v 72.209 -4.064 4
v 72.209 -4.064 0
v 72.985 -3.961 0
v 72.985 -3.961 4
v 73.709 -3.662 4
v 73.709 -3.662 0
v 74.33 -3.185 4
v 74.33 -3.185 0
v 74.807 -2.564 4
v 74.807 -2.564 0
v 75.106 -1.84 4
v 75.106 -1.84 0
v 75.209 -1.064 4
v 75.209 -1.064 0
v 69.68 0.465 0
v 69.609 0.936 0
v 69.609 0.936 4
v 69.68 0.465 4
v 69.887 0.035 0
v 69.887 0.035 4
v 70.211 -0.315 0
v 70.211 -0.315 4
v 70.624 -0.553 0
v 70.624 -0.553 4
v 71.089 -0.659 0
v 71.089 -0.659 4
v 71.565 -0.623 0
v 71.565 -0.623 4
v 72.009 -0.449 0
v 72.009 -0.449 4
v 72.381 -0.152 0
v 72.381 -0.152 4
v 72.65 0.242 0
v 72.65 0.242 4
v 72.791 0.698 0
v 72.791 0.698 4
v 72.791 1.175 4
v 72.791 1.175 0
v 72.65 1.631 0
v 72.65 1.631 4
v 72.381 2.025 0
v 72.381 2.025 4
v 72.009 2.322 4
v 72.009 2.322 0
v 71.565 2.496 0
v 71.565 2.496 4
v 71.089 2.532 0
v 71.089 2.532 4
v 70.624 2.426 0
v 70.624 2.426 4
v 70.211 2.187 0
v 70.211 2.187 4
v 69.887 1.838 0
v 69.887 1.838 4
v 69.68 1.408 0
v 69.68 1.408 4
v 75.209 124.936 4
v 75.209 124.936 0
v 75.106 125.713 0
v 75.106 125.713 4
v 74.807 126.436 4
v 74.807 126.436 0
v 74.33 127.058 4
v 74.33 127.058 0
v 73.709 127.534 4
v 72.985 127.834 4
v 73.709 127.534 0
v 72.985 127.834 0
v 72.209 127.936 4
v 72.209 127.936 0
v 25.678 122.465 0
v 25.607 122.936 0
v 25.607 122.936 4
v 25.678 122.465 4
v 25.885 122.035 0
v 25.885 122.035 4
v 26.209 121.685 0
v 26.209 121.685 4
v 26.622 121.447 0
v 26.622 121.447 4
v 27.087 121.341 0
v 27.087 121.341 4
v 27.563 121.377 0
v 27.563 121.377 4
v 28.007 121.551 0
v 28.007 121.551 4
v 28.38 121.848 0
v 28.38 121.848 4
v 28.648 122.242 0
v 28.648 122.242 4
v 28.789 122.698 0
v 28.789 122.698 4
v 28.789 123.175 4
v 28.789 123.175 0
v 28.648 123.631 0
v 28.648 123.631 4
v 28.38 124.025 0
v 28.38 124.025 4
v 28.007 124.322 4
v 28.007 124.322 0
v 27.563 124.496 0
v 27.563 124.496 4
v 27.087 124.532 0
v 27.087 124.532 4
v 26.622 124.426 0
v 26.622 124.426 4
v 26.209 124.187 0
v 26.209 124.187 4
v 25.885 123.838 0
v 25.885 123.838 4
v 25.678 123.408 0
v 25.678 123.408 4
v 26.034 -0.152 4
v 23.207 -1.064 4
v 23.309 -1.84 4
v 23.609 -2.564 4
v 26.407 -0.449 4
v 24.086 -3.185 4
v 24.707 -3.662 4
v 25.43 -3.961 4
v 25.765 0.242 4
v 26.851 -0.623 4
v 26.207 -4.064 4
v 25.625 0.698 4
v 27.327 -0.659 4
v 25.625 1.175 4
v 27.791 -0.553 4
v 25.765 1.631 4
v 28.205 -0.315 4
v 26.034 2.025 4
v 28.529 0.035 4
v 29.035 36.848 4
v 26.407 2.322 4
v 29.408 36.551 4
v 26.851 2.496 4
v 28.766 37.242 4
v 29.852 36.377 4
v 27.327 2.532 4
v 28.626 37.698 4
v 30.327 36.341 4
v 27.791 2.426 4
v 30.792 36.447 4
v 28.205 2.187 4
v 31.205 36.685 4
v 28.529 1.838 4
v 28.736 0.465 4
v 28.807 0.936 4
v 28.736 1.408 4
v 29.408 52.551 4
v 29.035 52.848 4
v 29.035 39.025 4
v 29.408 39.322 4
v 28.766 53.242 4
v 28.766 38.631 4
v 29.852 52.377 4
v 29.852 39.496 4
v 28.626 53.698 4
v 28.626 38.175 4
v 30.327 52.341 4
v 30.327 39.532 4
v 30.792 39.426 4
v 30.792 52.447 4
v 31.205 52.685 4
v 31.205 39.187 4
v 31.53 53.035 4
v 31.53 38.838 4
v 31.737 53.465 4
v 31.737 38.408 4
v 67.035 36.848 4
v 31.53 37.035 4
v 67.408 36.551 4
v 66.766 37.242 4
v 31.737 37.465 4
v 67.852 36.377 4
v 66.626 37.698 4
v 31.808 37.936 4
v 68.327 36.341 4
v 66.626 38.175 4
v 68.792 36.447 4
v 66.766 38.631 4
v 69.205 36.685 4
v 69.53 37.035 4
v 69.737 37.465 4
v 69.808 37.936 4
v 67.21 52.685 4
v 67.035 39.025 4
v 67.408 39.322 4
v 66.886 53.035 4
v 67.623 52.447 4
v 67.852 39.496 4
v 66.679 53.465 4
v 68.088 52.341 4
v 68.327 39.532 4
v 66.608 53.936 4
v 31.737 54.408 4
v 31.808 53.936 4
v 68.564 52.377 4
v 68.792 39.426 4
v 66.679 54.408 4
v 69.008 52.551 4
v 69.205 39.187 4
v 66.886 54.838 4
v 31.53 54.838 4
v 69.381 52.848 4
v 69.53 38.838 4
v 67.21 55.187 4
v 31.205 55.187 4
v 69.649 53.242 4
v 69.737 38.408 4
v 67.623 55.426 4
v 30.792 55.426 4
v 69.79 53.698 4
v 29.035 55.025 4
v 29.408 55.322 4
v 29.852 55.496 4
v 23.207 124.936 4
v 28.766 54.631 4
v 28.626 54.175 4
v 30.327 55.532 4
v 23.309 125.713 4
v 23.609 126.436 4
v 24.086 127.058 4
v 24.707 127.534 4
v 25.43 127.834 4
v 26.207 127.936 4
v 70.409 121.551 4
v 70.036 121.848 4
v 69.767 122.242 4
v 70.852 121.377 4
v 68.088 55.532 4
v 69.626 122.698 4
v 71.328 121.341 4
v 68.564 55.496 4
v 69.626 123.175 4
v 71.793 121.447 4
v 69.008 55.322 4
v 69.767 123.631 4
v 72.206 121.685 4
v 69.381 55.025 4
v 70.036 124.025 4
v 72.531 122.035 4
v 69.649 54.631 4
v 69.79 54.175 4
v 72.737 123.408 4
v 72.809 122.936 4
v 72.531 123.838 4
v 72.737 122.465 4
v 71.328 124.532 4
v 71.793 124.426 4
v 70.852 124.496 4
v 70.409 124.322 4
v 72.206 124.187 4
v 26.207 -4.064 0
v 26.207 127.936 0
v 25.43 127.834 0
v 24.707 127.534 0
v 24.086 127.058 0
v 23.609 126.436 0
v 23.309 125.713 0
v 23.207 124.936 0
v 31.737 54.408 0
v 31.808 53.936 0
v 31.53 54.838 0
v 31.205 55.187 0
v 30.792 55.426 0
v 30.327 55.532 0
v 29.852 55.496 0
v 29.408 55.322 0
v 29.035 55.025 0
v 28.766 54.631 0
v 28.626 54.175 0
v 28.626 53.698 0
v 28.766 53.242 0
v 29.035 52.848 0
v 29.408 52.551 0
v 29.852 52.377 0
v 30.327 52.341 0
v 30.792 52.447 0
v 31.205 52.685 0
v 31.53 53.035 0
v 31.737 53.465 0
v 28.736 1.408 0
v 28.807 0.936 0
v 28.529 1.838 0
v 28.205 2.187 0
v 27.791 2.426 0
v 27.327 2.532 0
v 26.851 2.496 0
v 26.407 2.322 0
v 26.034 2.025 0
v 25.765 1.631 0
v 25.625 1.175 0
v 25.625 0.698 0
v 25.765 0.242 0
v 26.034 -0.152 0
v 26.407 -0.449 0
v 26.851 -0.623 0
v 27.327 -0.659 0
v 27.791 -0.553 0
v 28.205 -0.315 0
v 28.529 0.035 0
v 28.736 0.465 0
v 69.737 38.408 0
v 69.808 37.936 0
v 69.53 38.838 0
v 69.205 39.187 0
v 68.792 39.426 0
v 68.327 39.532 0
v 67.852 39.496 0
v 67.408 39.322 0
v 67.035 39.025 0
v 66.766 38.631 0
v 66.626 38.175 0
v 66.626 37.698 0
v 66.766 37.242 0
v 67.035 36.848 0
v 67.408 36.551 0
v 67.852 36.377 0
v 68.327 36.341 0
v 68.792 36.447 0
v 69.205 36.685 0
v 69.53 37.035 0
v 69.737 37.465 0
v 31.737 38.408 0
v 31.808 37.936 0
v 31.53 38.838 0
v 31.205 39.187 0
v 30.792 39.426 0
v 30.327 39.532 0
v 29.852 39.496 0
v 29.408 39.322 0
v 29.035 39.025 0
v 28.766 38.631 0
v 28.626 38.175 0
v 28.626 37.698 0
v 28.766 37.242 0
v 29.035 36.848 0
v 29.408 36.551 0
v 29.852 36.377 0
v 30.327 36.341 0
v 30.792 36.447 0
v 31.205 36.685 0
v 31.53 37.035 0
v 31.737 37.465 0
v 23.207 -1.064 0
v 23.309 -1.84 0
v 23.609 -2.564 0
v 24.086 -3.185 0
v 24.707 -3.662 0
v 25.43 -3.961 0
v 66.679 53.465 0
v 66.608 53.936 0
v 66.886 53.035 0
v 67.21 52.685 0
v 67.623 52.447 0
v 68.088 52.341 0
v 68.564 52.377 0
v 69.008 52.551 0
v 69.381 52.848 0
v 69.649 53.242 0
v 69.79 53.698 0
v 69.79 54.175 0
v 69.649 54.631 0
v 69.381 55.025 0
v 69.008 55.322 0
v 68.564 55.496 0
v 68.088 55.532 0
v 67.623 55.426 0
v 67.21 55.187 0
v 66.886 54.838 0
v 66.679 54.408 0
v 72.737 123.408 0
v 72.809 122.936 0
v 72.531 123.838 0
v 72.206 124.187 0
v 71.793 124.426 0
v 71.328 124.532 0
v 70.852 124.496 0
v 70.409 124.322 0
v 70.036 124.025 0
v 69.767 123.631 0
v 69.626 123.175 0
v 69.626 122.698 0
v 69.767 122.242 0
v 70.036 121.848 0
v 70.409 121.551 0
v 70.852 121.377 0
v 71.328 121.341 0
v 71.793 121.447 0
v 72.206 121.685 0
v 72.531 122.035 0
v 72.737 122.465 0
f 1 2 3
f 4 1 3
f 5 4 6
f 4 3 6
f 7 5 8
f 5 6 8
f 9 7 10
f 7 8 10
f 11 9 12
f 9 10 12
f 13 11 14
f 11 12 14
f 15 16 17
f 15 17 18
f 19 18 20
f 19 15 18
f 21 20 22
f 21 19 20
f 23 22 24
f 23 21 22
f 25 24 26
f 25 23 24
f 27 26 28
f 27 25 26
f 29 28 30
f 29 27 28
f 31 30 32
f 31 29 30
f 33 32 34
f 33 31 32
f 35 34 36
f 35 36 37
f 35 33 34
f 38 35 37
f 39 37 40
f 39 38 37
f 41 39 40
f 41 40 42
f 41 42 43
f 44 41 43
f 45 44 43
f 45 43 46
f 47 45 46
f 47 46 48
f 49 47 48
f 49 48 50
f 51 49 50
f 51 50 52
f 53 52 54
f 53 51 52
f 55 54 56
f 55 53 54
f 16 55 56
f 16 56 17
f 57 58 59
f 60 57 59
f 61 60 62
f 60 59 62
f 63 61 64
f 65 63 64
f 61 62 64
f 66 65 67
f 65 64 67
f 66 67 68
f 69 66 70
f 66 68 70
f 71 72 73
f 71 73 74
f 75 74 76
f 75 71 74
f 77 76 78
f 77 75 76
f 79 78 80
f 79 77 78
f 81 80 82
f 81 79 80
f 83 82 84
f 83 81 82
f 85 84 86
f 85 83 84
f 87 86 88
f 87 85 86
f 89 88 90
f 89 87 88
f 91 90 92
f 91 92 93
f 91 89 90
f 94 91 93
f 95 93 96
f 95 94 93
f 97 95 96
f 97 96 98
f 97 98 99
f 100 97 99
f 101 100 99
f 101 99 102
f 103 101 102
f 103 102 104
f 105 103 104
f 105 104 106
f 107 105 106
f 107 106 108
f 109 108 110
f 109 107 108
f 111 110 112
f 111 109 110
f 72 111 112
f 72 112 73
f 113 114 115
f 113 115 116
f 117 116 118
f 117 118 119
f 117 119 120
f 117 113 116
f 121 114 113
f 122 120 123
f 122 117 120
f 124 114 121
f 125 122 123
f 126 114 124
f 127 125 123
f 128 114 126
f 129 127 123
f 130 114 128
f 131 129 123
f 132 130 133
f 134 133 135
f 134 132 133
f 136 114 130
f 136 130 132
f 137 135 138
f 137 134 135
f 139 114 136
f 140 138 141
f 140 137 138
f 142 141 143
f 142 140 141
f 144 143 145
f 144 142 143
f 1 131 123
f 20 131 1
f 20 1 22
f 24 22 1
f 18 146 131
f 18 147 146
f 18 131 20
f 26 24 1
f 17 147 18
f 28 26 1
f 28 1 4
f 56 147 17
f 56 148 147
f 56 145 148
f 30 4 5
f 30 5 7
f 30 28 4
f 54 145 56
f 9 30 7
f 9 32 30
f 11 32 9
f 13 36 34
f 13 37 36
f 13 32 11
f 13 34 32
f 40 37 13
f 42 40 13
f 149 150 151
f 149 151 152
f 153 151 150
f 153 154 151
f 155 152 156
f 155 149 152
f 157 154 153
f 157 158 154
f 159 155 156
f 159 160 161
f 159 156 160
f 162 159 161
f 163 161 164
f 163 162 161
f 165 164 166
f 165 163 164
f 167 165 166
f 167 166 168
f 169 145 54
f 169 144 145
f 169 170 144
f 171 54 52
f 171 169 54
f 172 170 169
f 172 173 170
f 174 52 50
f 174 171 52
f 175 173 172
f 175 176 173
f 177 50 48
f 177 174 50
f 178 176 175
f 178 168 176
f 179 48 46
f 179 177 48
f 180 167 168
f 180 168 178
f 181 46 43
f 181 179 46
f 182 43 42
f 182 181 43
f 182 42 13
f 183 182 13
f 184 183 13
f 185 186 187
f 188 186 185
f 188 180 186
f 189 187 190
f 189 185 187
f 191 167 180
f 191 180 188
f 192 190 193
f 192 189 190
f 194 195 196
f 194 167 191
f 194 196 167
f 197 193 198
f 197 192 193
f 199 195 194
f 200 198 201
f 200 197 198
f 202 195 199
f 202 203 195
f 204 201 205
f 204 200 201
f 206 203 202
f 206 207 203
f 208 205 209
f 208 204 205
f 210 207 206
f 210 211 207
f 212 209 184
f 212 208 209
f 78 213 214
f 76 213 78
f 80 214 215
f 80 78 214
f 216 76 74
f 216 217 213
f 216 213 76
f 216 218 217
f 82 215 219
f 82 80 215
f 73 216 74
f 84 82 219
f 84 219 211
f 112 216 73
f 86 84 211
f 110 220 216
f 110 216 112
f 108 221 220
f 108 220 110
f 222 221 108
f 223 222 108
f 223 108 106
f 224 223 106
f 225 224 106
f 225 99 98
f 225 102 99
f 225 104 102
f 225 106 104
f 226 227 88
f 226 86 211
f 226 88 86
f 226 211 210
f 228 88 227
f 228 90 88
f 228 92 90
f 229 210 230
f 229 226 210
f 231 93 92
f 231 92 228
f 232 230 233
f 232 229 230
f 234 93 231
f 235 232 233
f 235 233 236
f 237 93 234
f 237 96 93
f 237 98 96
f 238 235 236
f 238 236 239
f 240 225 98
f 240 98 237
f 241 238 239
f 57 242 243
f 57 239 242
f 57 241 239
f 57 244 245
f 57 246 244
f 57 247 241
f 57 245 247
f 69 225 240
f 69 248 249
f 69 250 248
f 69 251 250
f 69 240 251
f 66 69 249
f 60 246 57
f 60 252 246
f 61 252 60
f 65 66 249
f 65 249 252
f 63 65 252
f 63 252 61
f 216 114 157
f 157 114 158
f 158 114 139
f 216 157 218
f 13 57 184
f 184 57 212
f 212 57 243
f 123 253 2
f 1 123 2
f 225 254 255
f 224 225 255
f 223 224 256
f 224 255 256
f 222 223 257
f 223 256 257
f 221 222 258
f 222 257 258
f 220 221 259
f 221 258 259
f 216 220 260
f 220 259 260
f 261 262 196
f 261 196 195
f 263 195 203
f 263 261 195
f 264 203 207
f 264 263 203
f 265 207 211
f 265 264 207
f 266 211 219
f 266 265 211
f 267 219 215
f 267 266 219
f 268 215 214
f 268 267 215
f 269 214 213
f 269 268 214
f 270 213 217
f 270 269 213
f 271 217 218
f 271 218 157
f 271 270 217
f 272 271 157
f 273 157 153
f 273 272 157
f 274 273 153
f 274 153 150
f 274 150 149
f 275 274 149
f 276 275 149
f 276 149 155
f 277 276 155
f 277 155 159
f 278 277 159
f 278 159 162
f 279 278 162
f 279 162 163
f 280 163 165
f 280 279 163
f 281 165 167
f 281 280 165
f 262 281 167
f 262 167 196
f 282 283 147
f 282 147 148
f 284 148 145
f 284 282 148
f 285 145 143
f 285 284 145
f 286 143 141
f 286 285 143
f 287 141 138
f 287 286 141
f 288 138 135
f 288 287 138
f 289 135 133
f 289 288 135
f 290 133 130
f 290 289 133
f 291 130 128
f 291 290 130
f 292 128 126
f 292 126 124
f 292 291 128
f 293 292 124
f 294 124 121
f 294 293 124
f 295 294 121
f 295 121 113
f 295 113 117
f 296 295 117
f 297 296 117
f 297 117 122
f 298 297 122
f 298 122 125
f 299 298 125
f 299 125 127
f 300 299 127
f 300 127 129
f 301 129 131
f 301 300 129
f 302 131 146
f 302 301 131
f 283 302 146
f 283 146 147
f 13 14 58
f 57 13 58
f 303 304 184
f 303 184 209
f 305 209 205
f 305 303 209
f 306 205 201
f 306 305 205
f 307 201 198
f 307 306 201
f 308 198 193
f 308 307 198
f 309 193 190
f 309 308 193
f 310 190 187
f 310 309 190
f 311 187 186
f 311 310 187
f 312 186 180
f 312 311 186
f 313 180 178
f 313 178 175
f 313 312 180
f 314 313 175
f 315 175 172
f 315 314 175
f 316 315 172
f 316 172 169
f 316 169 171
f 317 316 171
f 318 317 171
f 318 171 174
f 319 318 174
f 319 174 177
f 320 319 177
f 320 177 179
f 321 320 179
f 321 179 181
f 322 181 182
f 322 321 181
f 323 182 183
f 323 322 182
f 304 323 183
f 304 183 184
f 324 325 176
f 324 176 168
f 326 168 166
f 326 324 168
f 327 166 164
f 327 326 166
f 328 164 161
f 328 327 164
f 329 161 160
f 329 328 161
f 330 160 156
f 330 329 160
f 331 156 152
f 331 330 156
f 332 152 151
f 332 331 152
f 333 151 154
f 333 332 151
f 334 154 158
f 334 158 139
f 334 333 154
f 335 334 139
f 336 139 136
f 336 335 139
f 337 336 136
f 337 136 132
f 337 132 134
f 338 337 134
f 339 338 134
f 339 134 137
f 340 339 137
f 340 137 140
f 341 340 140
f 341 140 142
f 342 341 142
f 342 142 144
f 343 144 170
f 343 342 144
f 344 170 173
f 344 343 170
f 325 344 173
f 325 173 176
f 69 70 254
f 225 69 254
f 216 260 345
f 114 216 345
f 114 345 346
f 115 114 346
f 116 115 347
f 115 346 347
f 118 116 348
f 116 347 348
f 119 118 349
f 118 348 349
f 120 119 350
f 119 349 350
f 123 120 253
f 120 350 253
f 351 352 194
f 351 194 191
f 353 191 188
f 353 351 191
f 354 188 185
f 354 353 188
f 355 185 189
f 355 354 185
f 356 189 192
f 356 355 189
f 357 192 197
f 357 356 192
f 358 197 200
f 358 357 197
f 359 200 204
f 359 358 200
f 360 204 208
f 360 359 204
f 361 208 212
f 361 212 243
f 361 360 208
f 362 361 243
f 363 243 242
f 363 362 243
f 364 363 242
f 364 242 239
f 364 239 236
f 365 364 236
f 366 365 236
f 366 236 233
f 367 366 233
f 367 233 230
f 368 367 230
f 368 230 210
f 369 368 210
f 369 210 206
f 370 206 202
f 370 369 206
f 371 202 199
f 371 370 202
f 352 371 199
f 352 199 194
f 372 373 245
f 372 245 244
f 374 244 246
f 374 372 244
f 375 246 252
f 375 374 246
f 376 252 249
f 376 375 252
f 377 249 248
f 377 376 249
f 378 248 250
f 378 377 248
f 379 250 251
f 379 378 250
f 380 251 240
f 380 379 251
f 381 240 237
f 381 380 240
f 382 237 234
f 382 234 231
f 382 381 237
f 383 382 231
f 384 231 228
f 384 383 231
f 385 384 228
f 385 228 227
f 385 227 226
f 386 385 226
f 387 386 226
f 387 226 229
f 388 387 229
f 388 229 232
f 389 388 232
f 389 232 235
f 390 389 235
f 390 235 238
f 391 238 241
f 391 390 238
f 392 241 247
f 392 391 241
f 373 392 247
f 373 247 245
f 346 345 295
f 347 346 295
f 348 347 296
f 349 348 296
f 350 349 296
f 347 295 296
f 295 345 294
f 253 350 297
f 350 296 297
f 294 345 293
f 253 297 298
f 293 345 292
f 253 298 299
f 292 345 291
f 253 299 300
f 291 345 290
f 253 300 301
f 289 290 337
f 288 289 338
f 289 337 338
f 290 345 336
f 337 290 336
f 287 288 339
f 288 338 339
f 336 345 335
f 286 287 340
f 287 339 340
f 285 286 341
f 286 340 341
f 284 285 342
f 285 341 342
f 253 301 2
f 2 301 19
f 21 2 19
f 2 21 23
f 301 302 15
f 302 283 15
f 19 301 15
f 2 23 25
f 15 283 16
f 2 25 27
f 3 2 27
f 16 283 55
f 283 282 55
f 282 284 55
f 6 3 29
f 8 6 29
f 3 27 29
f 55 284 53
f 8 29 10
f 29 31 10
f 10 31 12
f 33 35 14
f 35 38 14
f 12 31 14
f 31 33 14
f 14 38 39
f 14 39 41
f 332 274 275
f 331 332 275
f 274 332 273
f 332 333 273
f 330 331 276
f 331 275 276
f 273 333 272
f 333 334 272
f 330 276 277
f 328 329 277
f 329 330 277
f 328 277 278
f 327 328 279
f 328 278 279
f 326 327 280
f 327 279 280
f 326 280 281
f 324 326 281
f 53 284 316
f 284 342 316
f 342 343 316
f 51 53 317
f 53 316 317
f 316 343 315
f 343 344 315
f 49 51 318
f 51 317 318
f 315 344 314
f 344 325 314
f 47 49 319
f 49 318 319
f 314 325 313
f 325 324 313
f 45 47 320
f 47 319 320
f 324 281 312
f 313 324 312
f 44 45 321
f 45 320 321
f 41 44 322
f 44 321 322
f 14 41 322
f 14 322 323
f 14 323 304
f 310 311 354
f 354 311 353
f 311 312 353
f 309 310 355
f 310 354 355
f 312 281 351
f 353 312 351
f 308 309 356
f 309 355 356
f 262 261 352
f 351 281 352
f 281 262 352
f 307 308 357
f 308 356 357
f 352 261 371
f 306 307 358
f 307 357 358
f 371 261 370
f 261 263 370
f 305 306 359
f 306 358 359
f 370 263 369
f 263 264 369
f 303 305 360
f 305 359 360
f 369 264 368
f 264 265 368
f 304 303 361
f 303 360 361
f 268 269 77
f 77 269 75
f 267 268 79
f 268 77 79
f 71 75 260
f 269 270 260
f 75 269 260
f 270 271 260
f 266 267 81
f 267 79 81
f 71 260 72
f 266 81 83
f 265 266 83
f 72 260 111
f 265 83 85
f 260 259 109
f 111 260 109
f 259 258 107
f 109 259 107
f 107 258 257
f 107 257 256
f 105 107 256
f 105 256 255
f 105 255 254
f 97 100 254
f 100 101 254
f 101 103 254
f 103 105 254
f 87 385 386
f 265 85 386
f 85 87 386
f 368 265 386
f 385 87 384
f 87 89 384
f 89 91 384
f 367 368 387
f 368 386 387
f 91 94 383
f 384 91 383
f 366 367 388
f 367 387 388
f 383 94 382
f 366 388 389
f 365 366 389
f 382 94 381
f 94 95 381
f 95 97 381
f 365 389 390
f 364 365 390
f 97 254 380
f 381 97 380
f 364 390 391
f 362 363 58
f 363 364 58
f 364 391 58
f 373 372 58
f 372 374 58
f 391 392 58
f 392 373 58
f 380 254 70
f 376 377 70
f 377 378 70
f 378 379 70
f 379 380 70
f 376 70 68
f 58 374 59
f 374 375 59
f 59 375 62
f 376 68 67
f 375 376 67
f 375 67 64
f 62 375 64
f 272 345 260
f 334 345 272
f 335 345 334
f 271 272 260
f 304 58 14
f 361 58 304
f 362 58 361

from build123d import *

# Parameters (mm, degrees)
SKETCH1_R           = 1.6
BOSS_EXTRUDE1_DEPTH = 4


with BuildPart() as part:
    # Sketch1 → Boss-Extrude1 (new body)
    with BuildSketch(Plane.XY):
        with BuildLine():
            Line((23.206941284, 124.936391703), (23.206941284, -1.063608297))
            ThreePointArc((23.206941284, -1.063608297), (24.085620941, -3.184928641), (26.206941284, -4.063608297))
            Line((26.206941284, -4.063608297), (72.208519176, -4.063608297))
            ThreePointArc((72.208519176, -4.063608297), (74.32983952, -3.184928641), (75.208519176, -1.063608297))
            Line((75.208519176, -1.063608297), (75.208519176, 124.936391703))
            ThreePointArc((75.208519176, 124.936391703), (74.32983952, 127.057712046), (72.208519176, 127.936391703))
            Line((72.208519176, 127.936391703), (26.206941284, 127.936391703))
            ThreePointArc((26.206941284, 127.936391703), (24.085620941, 127.057712046), (23.206941284, 124.936391703))
        make_face()
        with Locations((30.20773023, 53.936391703)):
            Circle(SKETCH1_R, mode=Mode.SUBTRACT)
        with Locations((27.206941284, 0.936391703)):
            Circle(SKETCH1_R, mode=Mode.SUBTRACT)
        with Locations((30.20773023, 37.936391703)):
            Circle(SKETCH1_R, mode=Mode.SUBTRACT)
        with Locations((71.208519176, 122.936391703)):
            Circle(SKETCH1_R, mode=Mode.SUBTRACT)
        with Locations(Location((71.208519176, 0.936391703, 0), (0, 0, 180))):
            Circle(SKETCH1_R, mode=Mode.SUBTRACT)
        with Locations(Location((68.20773023, 53.936391703, 0), (0, 0, 180))):
            Circle(SKETCH1_R, mode=Mode.SUBTRACT)
        with Locations(Location((27.206941284, 122.936391703, 0), (0, 0, 180))):
            Circle(SKETCH1_R, mode=Mode.SUBTRACT)
        with Locations((68.20773023, 37.936391703)):
            Circle(SKETCH1_R, mode=Mode.SUBTRACT)
    extrude(amount=BOSS_EXTRUDE1_DEPTH)


solid = part.part
